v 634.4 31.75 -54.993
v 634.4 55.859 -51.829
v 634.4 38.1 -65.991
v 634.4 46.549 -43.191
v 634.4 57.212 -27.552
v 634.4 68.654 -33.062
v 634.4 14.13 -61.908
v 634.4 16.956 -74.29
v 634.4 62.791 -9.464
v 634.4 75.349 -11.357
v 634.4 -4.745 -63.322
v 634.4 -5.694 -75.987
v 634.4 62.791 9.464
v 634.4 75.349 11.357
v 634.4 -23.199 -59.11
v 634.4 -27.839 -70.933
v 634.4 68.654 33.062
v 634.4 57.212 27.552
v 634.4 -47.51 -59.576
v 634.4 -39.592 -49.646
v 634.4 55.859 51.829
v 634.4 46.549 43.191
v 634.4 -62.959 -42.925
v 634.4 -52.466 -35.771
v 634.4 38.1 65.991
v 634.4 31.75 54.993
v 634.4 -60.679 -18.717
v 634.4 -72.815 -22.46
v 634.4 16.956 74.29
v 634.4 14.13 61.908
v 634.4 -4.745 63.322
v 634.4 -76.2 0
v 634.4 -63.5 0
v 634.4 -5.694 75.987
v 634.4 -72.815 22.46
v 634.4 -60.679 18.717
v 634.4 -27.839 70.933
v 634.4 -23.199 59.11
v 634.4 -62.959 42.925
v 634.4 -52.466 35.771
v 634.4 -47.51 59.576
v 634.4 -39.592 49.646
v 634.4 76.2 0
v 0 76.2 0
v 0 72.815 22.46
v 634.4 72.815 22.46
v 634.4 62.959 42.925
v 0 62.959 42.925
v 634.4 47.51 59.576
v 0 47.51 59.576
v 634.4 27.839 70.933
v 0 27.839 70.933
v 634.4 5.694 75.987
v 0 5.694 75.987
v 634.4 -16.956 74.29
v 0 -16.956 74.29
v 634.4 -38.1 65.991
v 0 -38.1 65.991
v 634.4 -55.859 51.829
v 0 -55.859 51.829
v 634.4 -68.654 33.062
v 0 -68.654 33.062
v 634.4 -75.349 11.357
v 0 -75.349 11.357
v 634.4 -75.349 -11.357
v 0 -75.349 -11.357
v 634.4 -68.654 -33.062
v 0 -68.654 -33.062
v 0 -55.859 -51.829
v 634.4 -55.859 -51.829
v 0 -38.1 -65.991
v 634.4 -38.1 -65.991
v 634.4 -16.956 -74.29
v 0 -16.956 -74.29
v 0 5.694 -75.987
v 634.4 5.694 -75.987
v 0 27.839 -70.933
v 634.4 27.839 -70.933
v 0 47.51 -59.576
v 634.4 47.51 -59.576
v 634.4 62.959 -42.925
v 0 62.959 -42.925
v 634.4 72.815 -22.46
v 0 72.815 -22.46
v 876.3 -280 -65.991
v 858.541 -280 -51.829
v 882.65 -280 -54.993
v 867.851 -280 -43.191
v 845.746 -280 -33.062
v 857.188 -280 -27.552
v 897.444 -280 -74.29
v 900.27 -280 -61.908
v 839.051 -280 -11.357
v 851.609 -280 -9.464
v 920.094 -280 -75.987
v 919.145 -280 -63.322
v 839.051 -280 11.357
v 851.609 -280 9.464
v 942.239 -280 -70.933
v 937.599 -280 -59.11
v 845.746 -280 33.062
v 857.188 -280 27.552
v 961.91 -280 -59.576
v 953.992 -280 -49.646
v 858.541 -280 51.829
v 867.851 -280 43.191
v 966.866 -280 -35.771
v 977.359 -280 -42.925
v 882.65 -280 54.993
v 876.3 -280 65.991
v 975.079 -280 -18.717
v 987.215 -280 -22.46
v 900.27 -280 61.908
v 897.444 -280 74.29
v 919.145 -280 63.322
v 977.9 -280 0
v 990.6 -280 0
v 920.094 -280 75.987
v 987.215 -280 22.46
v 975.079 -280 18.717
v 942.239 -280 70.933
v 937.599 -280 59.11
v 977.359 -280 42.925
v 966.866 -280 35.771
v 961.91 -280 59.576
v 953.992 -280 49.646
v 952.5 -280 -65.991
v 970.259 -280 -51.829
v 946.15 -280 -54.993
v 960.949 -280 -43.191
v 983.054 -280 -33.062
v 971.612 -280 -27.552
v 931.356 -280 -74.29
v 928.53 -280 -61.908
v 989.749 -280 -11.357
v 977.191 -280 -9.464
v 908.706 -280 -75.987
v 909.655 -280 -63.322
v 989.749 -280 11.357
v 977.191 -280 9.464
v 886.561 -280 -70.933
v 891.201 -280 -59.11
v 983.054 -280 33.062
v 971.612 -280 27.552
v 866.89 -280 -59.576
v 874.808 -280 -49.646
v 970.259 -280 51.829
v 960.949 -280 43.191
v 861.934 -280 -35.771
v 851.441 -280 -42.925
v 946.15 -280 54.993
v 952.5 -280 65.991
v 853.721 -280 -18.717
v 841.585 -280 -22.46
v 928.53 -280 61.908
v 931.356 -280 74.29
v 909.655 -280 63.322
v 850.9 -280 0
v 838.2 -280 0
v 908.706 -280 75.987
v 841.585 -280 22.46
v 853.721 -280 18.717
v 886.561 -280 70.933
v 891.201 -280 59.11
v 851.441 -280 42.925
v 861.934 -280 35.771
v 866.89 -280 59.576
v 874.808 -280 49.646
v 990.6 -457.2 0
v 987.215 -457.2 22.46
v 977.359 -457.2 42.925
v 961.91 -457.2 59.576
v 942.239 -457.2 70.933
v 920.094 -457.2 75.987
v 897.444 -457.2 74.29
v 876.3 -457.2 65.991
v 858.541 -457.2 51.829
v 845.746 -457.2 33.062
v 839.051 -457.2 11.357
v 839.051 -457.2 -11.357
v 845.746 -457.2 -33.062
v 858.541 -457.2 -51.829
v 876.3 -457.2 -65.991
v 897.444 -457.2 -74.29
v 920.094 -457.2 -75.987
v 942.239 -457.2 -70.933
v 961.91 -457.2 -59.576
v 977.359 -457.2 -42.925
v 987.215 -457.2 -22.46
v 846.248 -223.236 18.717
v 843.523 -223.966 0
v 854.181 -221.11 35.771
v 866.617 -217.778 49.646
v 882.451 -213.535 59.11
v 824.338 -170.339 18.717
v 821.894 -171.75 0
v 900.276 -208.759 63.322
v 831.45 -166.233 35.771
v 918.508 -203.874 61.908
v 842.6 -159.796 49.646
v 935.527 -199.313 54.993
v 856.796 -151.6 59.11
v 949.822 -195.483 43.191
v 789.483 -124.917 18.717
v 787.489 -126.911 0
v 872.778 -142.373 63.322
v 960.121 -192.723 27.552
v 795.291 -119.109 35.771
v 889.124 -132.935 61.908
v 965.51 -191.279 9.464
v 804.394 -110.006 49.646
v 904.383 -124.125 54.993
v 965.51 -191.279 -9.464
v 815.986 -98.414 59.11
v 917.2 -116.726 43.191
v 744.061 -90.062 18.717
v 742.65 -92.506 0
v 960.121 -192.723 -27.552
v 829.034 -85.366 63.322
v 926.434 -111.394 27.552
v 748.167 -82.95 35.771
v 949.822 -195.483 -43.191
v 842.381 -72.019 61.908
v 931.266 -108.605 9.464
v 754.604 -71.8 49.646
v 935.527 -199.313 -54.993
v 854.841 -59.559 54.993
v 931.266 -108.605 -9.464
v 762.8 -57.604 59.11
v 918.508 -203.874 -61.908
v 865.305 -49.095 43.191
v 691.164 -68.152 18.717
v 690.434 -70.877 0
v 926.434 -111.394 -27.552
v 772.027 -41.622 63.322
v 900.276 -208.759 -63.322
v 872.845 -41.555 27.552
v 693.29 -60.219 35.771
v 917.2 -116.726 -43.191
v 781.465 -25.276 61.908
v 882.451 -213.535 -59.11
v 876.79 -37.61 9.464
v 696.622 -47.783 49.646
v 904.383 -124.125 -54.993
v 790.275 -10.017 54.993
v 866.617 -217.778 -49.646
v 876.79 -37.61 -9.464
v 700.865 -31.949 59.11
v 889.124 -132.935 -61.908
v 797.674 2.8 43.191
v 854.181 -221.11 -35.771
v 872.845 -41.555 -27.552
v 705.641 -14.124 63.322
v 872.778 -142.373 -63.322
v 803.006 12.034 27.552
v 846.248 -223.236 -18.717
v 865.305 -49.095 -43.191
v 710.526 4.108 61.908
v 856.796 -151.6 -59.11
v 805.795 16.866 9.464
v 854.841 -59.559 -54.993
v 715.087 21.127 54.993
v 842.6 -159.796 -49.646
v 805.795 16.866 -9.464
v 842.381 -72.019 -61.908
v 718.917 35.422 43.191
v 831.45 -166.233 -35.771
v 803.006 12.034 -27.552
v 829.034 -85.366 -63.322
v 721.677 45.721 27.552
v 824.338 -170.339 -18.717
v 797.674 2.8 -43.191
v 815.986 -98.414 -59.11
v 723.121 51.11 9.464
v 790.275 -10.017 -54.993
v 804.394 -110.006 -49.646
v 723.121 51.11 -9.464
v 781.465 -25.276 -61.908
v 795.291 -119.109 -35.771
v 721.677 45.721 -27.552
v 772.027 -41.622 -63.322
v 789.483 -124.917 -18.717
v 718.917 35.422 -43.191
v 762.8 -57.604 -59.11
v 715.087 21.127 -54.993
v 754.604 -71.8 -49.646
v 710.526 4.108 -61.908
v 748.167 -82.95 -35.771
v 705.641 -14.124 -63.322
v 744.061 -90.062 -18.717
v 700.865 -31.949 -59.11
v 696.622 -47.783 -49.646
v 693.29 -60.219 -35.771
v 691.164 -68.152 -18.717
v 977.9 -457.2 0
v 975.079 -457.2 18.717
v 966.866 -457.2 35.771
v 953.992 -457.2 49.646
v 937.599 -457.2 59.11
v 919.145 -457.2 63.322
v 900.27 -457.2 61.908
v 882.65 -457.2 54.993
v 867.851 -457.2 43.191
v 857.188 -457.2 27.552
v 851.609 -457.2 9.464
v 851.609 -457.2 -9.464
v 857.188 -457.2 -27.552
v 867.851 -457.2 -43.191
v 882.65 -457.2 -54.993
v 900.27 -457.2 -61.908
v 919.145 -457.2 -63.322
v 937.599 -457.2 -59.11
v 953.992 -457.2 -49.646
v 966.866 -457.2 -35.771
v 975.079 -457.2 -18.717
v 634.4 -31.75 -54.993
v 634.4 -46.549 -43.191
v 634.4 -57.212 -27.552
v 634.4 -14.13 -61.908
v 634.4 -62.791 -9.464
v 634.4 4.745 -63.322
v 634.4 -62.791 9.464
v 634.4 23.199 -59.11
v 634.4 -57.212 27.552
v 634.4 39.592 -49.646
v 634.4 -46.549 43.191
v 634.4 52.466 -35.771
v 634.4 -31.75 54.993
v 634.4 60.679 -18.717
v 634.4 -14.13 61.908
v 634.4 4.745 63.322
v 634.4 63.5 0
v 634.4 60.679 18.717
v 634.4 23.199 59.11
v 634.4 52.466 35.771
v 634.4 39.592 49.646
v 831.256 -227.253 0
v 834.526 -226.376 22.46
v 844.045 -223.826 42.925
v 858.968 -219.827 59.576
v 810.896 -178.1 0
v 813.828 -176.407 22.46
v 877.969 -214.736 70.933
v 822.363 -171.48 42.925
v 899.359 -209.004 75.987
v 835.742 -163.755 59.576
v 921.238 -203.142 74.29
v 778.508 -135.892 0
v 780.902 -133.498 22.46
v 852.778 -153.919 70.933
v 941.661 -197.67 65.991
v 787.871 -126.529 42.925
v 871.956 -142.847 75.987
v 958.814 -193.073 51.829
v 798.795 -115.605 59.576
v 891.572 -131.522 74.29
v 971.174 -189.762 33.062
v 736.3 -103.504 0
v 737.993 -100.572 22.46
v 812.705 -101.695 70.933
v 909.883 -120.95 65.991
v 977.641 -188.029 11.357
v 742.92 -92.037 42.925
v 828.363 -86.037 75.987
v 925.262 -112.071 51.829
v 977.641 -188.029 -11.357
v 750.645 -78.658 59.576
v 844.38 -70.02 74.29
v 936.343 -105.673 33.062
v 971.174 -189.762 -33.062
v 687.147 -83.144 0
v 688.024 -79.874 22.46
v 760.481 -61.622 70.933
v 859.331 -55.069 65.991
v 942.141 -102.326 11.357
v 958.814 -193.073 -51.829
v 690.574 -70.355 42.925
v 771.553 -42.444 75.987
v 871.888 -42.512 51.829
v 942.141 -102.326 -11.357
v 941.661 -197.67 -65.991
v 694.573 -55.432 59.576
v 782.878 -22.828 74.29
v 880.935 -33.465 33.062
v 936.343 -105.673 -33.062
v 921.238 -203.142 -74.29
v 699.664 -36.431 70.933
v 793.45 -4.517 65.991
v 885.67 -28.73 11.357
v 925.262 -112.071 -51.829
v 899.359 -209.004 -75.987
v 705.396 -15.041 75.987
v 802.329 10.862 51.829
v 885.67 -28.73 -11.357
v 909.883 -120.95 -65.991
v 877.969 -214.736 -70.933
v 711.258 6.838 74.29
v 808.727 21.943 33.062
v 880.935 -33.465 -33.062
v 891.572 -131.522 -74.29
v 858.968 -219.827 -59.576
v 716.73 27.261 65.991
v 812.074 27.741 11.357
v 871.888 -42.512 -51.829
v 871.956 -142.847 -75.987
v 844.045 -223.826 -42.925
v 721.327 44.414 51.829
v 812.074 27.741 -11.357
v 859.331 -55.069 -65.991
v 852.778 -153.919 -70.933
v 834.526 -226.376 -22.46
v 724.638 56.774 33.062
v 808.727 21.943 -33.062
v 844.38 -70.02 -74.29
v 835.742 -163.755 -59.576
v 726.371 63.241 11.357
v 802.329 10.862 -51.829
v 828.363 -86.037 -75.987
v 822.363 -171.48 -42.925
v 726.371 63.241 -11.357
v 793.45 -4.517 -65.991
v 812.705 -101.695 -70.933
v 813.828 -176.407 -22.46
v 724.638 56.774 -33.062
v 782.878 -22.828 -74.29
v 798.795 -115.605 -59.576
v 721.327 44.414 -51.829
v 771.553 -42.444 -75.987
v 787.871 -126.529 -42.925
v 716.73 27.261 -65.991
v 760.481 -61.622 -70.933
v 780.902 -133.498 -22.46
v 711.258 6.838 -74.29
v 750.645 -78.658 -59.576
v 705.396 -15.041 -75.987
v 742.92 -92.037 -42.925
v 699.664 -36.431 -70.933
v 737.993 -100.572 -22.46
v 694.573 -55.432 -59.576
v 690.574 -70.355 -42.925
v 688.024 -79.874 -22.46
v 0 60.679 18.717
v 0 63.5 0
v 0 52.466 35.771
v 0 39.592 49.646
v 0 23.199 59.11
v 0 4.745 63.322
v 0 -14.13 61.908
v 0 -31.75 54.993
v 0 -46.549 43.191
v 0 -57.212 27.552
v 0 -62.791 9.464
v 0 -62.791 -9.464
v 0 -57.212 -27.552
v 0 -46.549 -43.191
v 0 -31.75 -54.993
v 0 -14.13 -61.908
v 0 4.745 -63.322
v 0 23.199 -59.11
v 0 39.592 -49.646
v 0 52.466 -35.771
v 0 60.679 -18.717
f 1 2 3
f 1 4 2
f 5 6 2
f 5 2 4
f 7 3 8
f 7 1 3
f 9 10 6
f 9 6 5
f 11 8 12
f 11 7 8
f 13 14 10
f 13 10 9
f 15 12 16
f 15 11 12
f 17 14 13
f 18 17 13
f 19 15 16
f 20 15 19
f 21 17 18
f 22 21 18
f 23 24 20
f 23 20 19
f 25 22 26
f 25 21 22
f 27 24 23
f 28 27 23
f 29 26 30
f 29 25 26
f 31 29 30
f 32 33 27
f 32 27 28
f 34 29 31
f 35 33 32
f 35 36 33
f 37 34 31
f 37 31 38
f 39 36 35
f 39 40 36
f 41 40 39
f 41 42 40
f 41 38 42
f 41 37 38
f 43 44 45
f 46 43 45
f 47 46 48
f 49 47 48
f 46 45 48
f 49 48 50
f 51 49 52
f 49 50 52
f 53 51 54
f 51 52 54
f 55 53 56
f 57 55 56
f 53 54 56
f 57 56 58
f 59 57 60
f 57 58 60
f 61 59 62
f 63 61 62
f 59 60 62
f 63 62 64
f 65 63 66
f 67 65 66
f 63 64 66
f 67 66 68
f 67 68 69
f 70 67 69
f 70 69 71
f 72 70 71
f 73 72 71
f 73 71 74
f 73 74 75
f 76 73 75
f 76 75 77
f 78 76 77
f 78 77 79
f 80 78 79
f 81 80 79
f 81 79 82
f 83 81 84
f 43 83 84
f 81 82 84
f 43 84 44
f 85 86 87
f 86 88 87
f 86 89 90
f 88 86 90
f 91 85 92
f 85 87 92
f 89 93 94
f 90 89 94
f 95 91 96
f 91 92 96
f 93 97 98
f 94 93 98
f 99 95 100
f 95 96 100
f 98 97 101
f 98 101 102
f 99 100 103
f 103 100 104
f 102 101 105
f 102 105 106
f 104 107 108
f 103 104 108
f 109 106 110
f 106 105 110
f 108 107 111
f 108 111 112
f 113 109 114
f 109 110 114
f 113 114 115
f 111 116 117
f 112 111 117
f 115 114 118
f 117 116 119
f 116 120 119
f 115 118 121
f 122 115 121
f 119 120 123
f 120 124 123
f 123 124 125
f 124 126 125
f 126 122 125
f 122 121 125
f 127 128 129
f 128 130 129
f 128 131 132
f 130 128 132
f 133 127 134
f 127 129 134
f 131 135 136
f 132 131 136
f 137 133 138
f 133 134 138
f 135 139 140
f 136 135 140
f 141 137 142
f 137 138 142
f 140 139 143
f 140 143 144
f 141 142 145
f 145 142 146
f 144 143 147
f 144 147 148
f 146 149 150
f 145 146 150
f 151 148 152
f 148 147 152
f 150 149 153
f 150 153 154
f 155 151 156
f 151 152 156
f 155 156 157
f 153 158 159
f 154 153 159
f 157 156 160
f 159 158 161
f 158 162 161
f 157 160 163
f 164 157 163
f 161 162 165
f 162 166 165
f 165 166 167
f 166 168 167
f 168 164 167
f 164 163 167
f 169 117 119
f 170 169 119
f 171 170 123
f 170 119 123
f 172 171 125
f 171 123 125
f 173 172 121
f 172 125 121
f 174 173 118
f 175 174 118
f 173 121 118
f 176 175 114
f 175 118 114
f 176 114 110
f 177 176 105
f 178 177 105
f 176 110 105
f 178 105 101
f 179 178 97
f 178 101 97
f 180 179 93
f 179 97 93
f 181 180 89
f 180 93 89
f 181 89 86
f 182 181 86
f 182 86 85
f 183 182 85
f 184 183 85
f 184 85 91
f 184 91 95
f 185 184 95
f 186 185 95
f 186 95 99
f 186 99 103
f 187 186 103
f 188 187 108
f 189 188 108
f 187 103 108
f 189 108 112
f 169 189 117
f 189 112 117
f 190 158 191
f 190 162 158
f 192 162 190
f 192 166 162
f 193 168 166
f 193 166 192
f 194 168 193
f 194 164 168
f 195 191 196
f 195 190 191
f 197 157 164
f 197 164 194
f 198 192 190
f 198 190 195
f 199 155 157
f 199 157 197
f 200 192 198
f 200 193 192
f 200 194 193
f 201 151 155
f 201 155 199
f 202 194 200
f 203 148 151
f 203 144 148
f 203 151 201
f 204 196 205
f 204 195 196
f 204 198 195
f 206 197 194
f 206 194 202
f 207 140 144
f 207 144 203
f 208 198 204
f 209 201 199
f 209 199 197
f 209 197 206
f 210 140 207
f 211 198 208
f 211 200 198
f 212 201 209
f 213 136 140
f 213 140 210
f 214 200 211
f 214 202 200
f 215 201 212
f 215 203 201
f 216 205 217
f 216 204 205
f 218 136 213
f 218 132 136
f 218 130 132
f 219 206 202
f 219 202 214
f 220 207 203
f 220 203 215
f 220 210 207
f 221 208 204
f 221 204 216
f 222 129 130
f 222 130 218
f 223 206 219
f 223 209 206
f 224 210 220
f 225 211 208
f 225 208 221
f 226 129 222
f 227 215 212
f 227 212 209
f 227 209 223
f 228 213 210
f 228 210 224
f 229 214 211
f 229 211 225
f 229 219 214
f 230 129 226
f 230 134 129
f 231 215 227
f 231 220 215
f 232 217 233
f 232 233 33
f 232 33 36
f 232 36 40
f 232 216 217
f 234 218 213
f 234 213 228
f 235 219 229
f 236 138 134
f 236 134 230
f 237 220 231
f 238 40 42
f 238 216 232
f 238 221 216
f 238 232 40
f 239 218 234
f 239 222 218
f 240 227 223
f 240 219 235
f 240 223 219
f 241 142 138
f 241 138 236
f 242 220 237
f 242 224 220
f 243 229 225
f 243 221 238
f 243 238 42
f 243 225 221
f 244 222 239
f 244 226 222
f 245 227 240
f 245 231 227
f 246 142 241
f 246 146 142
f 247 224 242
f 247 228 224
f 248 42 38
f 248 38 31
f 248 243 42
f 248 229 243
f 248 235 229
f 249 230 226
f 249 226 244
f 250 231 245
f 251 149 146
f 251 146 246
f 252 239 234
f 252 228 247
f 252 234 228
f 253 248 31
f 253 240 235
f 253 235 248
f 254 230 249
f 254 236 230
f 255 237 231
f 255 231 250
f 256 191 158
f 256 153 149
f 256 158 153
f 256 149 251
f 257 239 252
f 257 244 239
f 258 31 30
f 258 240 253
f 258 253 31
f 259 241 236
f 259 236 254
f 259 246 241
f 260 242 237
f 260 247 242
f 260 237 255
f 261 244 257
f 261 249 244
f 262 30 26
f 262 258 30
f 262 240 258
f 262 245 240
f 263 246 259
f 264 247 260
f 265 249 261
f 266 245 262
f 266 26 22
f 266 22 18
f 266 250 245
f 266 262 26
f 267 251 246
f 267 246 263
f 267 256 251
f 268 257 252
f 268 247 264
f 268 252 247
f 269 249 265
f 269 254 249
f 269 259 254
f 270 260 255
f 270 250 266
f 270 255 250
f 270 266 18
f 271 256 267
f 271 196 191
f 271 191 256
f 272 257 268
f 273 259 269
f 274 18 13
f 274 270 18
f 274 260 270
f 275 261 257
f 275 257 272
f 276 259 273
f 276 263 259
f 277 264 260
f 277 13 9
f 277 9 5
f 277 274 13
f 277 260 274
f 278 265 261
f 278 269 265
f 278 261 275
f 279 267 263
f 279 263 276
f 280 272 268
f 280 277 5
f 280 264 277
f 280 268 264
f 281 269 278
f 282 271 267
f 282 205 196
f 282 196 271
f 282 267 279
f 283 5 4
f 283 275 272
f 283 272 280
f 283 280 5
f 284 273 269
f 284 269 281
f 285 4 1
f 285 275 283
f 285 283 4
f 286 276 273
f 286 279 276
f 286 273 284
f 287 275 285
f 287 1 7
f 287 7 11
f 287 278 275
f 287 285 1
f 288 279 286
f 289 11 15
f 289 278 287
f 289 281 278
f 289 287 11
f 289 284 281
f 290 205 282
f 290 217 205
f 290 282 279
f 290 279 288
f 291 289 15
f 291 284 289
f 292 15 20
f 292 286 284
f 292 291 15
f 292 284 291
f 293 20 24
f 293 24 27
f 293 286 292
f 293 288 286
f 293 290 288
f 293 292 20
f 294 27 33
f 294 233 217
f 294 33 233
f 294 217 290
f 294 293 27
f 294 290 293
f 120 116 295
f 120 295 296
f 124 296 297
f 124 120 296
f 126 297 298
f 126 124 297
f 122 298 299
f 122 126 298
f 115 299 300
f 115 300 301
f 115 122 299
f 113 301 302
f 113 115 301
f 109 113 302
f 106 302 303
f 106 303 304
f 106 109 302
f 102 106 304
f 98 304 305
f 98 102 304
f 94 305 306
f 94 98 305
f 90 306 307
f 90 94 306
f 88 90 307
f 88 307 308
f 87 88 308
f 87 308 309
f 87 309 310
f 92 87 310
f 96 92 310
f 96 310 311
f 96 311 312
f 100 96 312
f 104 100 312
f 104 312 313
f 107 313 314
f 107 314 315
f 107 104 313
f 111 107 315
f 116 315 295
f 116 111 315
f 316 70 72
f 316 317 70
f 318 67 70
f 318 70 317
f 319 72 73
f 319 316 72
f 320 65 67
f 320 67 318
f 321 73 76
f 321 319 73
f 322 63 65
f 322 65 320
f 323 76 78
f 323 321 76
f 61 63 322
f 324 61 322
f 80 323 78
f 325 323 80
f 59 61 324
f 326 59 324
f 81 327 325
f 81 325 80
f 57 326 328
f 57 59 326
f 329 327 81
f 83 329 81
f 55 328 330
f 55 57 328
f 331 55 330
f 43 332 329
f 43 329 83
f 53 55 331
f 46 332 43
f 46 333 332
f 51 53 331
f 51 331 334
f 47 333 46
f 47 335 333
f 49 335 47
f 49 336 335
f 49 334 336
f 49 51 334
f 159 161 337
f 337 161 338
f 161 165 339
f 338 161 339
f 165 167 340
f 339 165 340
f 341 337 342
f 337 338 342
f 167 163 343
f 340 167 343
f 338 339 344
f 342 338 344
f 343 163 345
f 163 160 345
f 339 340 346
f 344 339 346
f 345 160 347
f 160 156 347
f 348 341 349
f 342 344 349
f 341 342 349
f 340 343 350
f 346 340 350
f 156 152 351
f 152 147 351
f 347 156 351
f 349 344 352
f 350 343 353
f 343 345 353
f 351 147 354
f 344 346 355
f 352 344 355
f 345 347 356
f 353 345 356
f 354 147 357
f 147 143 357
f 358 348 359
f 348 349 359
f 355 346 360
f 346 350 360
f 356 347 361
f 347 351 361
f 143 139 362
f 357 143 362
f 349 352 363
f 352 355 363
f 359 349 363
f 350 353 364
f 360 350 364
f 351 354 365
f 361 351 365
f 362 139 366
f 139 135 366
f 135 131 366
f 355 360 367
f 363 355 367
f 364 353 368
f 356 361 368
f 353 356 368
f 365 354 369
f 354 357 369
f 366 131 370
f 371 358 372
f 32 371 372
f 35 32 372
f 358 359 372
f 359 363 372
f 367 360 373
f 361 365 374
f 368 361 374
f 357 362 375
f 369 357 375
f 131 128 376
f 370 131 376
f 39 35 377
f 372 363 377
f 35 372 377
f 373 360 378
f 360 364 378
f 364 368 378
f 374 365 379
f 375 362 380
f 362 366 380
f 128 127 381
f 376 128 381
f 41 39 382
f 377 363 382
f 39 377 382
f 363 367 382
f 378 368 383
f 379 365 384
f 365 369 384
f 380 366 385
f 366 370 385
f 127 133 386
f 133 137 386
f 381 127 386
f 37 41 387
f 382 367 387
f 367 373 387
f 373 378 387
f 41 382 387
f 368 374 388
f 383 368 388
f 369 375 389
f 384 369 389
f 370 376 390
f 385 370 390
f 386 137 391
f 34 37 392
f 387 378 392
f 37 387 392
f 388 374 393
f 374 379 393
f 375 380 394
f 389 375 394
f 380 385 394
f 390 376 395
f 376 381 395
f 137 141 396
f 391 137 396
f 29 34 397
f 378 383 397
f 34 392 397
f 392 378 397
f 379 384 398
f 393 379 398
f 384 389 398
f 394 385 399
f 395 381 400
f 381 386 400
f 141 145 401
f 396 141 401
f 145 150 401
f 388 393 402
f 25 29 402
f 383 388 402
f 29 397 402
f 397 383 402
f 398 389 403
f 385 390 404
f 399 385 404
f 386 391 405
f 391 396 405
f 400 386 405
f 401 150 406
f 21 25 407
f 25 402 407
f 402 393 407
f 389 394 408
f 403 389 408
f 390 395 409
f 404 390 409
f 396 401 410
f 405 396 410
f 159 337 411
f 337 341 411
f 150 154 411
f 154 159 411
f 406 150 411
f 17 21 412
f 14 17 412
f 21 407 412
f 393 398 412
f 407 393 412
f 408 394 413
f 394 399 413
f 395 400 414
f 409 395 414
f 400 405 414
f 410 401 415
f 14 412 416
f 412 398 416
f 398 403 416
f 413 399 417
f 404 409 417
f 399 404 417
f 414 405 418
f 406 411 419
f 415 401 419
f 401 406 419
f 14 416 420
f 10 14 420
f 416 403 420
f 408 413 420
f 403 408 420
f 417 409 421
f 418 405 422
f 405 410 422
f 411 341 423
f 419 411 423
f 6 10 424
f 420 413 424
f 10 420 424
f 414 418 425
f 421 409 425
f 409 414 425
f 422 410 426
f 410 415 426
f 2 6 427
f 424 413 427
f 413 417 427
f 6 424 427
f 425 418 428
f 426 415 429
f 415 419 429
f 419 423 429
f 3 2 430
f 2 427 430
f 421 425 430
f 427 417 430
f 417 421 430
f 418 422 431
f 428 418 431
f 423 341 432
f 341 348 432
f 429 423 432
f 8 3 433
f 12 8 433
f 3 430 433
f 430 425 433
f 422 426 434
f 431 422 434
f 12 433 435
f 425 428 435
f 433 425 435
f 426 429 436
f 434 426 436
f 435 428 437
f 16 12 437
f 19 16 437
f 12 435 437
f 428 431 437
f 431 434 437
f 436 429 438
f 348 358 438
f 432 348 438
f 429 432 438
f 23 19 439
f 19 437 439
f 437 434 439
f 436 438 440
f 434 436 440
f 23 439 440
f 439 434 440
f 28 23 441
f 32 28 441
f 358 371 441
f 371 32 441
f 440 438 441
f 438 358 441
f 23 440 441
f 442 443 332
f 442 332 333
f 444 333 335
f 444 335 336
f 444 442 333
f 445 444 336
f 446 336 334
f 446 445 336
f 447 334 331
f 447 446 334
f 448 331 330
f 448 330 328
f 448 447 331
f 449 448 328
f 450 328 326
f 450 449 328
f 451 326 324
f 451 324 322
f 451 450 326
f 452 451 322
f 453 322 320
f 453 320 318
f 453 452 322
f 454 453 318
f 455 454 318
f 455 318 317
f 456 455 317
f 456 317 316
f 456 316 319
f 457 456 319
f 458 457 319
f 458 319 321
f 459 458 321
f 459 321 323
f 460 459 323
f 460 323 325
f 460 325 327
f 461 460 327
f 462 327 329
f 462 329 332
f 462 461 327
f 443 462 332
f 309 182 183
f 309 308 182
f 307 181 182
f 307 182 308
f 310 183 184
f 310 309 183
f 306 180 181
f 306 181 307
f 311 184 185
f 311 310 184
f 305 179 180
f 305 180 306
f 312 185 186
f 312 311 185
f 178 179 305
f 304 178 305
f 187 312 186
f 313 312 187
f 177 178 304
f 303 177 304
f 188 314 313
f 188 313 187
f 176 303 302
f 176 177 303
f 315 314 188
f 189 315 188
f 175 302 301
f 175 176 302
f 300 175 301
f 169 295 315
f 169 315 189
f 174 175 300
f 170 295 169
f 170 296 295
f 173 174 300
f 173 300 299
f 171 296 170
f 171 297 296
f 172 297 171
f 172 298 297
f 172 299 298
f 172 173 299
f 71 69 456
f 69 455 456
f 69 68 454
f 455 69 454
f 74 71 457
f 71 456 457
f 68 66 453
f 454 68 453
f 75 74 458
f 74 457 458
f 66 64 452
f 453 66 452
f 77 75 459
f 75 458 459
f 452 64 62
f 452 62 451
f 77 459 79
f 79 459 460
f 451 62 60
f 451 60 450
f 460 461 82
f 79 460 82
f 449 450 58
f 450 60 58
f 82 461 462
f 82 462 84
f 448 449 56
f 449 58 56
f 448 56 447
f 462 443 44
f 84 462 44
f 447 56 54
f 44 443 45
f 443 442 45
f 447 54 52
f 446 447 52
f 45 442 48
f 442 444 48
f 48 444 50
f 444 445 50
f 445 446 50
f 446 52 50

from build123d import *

# Parameters (mm, degrees)
SKETCH14_R                                     = 76.2
SKETCH14_R_2                                   = 63.5
AL_ROUND_TUBING_AL_RND_TUBE_6_OD_X_0_5_W_DEPTH = 634.4
SKETCH14_ON_SEGMENT_2_R                        = 76.2
SKETCH14_ON_SEGMENT_2_R_2                      = 63.5
AL_ROUND_TUBING_AL_RND_TUBE_6_OD_X_0_2_ANGLE   = 90
SKETCH14_ON_SEGMENT_3_R                        = 76.2
SKETCH14_ON_SEGMENT_3_R_2                      = 63.5
AL_ROUND_TUBING_AL_RND_TUBE_6_OD_X_0_3_DEPTH   = 177.2


with BuildPart() as part:
    # Sketch14 → Al round tubing AL RND TUBE 6 OD X 0.5 WALL(1) (new body)
    with BuildSketch(Plane.YZ):
        Circle(SKETCH14_R)
        Circle(SKETCH14_R_2, mode=Mode.SUBTRACT)
    extrude(amount=AL_ROUND_TUBING_AL_RND_TUBE_6_OD_X_0_5_W_DEPTH)


with BuildPart() as body_2:
    # Sketch14 on segment 2 (carried to the start of arc 2) → Al round tubing AL RND TUBE 6 OD X 0 2 (revolve)
    with BuildSketch(Plane(origin=(914.4, -280, 0), x_dir=(-1, 0, 0), z_dir=(0, 1, 0))):
        Circle(SKETCH14_ON_SEGMENT_2_R)
        Circle(SKETCH14_ON_SEGMENT_2_R_2, mode=Mode.SUBTRACT)
    revolve(axis=Axis((634.4, -280, 0), (0, 0, 1)), revolution_arc=AL_ROUND_TUBING_AL_RND_TUBE_6_OD_X_0_2_ANGLE)


with BuildPart() as body_3:
    # Sketch14 on segment 3 (carried to segment 3) → Al round tubing AL RND TUBE 6 OD X 0 3 (new body)
    with BuildSketch(Plane(origin=(914.4, -280, 0), x_dir=(1, 0, 0), z_dir=(0, -1, 0))):
        Circle(SKETCH14_ON_SEGMENT_3_R)
        Circle(SKETCH14_ON_SEGMENT_3_R_2, mode=Mode.SUBTRACT)
    extrude(amount=AL_ROUND_TUBING_AL_RND_TUBE_6_OD_X_0_3_DEPTH)


solid = Compound([part.part, body_2.part, body_3.part])
